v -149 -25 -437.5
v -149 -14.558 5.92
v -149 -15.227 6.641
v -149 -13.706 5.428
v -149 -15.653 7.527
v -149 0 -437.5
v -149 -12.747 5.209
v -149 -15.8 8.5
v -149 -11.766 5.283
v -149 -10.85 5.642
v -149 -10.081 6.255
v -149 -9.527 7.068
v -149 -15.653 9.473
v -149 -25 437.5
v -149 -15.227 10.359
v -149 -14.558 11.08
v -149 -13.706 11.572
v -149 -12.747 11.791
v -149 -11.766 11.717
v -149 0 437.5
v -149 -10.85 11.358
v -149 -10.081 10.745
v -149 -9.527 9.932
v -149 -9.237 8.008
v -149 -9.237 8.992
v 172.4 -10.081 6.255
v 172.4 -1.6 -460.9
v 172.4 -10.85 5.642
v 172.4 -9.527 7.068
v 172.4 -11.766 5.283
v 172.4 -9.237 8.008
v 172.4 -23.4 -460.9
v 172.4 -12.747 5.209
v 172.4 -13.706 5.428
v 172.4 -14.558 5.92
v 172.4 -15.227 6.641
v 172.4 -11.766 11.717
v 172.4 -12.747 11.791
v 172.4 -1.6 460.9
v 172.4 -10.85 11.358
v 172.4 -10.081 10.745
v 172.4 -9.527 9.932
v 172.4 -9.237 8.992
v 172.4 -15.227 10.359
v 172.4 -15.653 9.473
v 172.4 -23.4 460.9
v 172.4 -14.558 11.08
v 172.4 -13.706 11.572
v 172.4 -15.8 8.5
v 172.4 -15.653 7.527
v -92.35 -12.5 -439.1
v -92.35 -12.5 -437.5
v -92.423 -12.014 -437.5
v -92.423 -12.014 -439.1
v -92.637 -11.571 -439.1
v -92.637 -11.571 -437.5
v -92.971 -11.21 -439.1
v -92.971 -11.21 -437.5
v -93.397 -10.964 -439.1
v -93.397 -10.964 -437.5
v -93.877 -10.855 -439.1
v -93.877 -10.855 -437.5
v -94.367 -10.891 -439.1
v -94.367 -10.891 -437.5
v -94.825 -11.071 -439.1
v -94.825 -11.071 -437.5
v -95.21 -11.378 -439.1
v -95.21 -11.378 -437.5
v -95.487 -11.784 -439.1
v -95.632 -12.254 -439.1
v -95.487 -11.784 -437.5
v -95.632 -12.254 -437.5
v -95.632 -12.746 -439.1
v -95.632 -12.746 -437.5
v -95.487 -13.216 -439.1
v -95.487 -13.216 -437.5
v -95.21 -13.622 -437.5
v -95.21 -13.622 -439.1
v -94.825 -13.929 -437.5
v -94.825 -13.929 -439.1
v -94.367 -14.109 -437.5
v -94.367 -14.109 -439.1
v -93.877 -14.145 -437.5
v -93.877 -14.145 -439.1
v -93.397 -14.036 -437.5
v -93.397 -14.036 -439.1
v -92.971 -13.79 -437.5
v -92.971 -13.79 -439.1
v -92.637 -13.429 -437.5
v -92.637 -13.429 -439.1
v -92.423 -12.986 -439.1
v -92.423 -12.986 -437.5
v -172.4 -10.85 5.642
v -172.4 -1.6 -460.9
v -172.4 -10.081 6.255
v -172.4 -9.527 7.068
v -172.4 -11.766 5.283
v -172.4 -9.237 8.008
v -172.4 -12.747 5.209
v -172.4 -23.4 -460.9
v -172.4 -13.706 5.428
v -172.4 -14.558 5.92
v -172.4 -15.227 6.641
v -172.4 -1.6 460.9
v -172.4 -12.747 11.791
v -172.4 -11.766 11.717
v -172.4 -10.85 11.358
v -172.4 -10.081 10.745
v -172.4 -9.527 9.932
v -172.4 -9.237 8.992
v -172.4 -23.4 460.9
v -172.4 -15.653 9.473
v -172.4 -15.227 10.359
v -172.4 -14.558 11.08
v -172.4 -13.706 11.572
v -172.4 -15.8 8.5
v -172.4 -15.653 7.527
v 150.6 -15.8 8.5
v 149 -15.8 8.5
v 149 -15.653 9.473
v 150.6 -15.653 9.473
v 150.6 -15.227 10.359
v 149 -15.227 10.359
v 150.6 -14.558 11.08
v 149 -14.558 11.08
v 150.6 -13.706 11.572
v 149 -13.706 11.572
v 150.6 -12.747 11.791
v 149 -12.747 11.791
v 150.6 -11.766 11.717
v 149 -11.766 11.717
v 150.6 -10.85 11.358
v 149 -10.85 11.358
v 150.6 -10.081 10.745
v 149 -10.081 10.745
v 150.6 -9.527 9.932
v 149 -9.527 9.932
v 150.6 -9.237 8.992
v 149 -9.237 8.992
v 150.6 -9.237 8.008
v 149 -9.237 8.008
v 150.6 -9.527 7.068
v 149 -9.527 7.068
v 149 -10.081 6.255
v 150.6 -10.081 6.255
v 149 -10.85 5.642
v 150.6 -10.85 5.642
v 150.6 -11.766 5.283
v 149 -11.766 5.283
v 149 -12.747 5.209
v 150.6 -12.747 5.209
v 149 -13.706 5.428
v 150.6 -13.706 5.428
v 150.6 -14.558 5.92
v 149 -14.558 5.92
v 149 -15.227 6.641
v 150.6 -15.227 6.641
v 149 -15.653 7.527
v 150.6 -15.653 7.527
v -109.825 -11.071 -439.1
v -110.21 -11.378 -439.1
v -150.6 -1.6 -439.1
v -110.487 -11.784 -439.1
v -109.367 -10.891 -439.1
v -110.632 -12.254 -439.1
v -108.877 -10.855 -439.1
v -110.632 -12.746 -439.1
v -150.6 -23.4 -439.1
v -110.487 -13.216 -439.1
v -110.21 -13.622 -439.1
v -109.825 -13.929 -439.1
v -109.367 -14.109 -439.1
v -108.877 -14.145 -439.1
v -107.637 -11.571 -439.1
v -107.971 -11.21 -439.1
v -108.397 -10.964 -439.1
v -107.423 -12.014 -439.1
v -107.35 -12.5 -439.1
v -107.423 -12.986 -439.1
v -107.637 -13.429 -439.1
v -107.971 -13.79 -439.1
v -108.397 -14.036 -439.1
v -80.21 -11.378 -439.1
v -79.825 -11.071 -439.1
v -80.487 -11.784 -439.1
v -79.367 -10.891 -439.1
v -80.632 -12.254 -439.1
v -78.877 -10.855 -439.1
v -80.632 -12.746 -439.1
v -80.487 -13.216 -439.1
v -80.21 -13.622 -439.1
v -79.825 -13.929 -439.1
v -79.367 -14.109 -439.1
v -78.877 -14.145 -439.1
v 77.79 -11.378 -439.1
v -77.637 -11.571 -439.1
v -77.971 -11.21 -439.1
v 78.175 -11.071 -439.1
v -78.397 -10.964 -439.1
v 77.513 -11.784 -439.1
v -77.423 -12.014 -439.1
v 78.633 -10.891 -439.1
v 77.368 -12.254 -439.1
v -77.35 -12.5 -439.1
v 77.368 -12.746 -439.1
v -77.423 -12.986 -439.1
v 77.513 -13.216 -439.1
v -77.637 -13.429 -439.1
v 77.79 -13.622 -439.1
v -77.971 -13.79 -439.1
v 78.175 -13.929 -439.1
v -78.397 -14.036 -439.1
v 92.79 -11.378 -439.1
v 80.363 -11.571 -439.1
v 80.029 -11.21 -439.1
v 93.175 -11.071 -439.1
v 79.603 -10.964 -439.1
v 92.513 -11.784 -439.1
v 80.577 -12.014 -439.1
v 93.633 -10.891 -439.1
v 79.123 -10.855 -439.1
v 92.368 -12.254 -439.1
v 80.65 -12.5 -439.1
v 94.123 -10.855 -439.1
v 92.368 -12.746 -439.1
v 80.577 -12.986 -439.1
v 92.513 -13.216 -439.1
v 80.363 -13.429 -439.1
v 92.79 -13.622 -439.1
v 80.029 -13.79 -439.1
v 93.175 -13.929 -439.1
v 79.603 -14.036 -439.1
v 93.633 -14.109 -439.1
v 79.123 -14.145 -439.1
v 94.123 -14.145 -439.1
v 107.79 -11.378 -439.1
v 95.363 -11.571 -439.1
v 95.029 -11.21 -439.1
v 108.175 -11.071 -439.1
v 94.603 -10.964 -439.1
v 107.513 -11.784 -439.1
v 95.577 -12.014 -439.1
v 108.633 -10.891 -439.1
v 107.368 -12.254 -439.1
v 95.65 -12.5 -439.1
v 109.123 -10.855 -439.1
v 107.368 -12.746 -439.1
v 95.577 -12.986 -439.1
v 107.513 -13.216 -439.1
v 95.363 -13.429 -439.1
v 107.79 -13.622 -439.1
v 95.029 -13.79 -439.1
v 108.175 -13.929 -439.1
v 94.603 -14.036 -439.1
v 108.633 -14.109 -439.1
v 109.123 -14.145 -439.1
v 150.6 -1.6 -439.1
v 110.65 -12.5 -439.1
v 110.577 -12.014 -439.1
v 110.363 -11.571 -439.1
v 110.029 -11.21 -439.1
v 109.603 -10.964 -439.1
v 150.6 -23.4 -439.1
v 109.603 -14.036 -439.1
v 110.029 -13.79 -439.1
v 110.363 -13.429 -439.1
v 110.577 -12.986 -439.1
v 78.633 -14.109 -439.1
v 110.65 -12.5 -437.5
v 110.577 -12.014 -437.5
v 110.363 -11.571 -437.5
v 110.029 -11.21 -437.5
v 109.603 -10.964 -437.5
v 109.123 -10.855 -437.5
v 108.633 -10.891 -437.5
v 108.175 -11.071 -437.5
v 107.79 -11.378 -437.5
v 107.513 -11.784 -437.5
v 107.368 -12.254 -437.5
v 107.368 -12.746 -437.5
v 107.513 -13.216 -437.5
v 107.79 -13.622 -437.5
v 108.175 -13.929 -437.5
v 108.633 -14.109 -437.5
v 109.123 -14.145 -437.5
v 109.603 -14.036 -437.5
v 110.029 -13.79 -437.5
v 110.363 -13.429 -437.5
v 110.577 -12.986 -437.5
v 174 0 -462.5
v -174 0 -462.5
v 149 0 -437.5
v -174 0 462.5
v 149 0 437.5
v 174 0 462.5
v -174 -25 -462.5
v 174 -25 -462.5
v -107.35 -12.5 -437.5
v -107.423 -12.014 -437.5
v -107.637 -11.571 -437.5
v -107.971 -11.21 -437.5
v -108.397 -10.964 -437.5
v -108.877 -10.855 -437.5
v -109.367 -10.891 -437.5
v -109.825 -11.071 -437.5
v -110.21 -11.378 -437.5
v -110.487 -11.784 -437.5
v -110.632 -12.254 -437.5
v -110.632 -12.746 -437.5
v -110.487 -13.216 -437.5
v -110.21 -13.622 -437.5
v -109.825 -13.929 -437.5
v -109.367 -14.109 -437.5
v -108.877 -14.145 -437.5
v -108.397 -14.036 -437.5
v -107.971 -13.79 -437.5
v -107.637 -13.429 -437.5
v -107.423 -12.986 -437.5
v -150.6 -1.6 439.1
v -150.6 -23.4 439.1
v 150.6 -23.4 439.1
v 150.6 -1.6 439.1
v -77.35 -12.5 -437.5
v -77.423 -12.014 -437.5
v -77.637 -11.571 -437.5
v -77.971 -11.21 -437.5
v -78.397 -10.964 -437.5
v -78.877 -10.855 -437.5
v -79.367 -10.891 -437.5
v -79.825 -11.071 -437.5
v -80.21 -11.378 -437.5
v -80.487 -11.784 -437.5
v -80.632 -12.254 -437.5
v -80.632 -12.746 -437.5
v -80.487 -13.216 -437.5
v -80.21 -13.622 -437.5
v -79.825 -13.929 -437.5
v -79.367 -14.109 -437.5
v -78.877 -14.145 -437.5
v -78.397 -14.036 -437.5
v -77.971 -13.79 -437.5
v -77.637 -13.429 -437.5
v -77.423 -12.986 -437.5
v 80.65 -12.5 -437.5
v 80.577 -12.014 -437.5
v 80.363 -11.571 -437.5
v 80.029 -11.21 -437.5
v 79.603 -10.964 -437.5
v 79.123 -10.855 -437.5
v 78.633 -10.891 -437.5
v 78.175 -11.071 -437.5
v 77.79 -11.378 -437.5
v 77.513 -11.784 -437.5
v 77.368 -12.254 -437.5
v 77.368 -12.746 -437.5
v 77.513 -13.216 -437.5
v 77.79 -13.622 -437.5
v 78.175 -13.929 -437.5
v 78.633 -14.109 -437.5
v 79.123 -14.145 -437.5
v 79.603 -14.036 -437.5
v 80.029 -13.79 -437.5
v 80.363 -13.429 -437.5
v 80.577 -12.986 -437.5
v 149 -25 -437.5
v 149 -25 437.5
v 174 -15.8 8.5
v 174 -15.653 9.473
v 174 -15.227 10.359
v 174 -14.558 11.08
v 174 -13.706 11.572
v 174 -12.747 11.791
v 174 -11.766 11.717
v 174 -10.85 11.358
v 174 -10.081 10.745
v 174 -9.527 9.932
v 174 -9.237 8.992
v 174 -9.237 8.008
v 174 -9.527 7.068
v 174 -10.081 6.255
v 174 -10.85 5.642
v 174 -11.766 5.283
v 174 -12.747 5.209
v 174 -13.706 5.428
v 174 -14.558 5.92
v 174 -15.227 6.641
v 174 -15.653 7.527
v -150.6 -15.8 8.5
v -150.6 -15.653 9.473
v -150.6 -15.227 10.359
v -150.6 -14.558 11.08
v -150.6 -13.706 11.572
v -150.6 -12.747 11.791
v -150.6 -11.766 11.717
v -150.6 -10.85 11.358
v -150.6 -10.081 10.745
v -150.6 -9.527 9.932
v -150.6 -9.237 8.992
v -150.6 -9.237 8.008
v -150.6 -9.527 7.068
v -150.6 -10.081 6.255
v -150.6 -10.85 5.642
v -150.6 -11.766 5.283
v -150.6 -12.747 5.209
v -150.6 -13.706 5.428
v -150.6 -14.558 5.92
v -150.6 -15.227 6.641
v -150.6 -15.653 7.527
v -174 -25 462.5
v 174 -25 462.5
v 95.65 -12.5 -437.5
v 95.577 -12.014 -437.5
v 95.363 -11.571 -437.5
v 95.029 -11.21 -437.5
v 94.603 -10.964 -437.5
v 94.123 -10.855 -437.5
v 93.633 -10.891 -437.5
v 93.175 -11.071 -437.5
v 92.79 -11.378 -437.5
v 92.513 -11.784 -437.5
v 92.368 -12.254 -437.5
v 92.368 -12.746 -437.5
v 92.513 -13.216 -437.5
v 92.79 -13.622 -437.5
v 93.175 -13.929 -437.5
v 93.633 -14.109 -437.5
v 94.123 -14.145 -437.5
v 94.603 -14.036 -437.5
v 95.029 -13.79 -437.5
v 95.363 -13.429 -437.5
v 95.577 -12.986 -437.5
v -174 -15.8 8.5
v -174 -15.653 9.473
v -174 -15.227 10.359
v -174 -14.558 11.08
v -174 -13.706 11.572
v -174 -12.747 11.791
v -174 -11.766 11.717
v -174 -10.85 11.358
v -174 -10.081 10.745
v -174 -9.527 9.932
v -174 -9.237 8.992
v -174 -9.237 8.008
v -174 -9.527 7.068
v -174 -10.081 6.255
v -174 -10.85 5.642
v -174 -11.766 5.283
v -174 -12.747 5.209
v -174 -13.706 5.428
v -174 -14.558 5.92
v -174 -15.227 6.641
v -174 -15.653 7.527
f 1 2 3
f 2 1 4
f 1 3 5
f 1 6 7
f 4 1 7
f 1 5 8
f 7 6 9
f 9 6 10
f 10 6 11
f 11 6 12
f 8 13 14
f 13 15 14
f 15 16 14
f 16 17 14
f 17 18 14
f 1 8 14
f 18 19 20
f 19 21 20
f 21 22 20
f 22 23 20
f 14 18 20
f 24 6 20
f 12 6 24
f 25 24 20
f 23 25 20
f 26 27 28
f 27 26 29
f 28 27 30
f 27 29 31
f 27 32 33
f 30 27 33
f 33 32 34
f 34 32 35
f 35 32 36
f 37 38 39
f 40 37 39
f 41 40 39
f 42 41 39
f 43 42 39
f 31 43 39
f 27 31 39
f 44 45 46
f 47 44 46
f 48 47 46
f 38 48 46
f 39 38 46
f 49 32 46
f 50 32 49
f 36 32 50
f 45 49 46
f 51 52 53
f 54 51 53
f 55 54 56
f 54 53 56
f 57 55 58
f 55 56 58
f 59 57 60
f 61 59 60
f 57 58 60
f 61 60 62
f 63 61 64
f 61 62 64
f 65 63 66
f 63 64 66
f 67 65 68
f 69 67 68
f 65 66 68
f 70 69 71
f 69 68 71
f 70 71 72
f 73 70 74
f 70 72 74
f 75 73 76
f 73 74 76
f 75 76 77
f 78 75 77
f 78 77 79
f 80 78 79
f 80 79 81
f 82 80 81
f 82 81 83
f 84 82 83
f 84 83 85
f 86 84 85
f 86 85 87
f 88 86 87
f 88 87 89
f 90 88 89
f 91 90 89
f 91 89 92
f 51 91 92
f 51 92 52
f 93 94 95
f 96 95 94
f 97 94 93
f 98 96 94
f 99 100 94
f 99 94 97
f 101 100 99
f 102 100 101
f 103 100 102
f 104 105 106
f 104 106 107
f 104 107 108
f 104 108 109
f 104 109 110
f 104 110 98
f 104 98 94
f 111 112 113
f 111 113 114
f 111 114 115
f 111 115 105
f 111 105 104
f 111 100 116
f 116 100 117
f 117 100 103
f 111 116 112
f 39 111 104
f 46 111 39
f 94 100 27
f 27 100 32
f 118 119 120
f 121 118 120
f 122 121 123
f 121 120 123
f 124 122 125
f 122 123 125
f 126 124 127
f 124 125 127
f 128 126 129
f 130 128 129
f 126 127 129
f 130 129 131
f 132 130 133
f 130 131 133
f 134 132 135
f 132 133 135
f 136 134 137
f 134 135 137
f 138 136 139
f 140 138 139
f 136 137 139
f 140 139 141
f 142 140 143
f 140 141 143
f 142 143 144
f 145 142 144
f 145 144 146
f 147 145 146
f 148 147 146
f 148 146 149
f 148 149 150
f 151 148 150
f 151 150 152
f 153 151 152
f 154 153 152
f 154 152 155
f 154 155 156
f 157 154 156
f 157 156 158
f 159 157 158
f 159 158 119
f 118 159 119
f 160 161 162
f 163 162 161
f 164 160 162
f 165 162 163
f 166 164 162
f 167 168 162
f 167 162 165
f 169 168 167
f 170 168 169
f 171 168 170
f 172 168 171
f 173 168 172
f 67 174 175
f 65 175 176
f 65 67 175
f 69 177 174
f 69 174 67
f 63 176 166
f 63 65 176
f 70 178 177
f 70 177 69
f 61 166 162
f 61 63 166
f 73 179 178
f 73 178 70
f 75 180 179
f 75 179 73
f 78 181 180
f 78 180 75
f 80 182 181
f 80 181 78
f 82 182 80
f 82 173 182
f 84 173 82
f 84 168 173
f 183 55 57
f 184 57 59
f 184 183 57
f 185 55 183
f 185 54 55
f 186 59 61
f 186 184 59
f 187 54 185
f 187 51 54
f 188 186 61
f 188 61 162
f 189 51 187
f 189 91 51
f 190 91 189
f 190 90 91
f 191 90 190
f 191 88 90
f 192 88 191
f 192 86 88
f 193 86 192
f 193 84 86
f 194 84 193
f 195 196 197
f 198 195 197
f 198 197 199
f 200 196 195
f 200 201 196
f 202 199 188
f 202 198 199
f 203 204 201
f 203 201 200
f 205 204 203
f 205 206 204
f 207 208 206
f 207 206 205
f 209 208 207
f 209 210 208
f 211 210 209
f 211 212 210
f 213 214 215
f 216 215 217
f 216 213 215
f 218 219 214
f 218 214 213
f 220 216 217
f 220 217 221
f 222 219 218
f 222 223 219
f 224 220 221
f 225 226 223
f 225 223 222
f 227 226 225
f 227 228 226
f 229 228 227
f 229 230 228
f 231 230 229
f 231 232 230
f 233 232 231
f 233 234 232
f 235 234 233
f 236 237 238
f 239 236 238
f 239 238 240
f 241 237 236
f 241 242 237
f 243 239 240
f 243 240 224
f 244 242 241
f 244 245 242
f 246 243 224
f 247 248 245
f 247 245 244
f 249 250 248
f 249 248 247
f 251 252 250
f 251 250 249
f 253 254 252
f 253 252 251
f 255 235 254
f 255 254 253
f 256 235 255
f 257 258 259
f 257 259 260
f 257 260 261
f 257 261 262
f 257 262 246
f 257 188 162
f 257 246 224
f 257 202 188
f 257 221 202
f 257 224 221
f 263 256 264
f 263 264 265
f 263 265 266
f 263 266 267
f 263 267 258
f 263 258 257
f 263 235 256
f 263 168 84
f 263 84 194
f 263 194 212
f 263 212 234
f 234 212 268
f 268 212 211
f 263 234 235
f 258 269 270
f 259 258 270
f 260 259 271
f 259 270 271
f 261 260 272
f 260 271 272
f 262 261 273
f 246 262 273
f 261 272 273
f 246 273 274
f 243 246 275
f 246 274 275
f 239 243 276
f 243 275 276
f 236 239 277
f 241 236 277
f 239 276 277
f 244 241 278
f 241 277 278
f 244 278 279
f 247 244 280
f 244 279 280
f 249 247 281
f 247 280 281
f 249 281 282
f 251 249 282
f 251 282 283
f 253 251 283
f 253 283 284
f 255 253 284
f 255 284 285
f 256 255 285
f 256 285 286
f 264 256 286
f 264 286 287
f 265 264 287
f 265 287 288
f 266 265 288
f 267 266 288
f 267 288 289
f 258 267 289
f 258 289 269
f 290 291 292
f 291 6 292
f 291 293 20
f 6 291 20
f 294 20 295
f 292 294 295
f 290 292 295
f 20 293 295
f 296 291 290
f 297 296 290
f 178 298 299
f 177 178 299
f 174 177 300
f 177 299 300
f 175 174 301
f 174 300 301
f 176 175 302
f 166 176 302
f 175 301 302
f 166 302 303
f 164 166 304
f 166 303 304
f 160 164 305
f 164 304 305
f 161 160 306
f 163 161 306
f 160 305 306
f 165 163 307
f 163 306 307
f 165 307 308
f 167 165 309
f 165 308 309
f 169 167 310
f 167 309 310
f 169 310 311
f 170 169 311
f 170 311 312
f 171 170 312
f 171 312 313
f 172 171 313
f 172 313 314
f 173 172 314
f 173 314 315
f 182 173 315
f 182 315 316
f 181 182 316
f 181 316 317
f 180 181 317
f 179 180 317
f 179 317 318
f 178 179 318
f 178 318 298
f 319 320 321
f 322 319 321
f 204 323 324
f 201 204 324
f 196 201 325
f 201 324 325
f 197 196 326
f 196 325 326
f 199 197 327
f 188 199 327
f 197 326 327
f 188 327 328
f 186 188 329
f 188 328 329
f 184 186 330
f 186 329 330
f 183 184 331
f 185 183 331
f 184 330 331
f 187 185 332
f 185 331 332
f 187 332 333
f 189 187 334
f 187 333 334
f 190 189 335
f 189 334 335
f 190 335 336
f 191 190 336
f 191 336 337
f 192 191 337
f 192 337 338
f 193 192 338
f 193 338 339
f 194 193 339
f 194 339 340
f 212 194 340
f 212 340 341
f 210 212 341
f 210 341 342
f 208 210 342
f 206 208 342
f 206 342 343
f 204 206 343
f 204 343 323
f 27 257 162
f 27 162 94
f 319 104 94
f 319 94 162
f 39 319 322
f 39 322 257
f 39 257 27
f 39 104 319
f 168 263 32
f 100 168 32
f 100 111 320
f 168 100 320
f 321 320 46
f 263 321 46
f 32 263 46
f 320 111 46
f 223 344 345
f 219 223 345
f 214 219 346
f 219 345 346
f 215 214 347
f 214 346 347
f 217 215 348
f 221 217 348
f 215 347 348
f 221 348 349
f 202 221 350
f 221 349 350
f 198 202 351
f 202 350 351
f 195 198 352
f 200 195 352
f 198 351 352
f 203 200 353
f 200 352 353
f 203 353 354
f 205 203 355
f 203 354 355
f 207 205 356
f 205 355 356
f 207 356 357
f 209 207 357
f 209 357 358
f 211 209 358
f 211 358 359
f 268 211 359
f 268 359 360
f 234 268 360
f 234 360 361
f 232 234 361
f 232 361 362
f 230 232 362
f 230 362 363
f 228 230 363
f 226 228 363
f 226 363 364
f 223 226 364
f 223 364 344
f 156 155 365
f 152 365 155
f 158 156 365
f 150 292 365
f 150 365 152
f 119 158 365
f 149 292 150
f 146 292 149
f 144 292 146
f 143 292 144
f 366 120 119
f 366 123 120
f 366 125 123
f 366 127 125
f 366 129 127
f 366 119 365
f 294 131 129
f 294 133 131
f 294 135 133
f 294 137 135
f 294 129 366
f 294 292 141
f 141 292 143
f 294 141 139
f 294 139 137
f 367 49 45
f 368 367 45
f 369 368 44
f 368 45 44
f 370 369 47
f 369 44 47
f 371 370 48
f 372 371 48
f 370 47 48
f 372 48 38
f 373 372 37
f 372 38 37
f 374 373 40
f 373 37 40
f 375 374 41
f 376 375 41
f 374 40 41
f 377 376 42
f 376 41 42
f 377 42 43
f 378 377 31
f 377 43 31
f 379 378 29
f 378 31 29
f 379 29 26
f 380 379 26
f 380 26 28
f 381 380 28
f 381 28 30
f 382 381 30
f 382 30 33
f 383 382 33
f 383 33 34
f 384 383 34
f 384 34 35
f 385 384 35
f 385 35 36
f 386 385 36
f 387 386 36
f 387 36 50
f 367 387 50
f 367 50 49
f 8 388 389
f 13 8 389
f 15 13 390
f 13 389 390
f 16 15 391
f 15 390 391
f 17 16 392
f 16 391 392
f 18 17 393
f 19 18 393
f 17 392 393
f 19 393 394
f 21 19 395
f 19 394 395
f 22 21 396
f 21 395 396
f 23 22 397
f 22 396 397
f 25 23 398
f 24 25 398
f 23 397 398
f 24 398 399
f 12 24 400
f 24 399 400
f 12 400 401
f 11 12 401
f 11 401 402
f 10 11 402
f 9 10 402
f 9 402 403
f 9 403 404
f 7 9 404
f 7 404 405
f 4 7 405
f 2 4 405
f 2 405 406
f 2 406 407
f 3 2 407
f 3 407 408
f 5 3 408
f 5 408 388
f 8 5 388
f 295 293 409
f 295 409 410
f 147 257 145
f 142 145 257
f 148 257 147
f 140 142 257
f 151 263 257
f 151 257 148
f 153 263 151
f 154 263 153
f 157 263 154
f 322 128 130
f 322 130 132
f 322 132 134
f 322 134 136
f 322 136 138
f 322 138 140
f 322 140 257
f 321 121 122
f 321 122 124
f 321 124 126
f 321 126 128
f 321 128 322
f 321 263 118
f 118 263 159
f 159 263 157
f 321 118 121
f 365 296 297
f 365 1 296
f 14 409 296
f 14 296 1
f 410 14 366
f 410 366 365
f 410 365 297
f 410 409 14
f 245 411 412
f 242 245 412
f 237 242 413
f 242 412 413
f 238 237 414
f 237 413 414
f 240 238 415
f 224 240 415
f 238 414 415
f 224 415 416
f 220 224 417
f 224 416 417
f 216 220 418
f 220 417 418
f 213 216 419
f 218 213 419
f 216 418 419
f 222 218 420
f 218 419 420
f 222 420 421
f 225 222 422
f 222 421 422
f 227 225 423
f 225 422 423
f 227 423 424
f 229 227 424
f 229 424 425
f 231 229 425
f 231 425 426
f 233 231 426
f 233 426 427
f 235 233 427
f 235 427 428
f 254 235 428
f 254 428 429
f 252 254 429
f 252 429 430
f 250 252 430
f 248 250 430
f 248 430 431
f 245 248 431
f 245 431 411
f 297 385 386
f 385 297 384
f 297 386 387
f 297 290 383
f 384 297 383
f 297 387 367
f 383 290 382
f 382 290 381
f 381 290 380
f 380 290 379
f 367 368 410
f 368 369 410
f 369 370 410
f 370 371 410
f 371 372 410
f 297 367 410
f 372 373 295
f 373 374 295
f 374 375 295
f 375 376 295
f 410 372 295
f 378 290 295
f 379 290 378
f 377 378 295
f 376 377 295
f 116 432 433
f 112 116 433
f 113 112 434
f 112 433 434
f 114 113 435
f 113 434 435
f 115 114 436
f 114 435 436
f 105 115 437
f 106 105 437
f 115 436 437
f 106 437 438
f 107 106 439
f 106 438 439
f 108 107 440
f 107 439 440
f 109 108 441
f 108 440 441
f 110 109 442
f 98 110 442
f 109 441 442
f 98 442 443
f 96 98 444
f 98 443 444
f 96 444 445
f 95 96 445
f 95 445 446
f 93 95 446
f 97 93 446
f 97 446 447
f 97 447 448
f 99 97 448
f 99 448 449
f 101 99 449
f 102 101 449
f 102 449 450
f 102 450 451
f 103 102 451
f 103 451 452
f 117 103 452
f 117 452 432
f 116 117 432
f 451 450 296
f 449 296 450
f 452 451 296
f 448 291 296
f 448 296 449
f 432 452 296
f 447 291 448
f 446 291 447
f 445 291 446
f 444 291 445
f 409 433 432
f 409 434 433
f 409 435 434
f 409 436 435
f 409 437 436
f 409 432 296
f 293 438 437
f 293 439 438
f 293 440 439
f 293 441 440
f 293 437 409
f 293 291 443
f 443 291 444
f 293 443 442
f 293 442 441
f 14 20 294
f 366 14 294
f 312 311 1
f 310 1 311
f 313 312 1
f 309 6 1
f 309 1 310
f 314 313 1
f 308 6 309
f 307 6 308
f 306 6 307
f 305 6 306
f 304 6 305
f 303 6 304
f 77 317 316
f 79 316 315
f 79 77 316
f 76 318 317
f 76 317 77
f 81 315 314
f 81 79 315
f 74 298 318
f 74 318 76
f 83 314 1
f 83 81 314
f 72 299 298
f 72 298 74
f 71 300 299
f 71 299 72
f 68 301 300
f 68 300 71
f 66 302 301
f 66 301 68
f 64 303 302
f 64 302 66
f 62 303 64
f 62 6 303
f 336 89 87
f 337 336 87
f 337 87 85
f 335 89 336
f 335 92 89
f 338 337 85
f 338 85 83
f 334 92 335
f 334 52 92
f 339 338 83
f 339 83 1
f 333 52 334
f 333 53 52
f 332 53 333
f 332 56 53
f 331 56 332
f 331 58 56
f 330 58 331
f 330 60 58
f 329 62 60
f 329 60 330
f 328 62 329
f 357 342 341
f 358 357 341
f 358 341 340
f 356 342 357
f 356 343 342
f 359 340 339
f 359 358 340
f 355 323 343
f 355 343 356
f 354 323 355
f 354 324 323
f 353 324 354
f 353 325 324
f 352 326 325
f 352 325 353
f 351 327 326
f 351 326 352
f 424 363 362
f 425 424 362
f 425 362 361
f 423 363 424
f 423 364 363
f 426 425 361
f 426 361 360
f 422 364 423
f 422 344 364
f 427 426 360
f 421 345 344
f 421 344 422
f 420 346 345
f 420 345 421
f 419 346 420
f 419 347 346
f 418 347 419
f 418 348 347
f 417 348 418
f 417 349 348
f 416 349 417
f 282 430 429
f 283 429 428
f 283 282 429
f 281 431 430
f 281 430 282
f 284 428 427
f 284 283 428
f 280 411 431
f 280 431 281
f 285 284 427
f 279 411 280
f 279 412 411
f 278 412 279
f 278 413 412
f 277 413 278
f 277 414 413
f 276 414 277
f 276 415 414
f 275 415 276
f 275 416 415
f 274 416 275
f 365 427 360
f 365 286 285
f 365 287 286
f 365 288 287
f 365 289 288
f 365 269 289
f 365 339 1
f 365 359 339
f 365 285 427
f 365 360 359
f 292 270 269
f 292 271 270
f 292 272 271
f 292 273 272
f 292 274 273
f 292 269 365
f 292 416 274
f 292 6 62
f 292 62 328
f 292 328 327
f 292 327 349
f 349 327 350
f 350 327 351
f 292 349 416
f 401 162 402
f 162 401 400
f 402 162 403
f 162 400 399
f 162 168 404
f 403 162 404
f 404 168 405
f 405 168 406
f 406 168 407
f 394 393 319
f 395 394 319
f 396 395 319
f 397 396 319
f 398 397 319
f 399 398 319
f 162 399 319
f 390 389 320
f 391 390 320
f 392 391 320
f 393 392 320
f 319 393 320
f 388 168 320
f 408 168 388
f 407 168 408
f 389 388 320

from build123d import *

# Parameters (mm, degrees)
F0_W     = 348
F0_H     = 925
F0_W_2   = 298
F0_H_2   = 875
F1_DEPTH = 25
F3_D     = 6.6
F3_DEPTH = 500
F3_TIP   = 1.9828400428
F4_R     = 1.65
F5_DEPTH = 4
F7_W     = 344.8
F7_H     = 921.8
F7_W_2   = 301.2
F7_H_2   = 878.2
F8_DEPTH = 21.8


with BuildPart() as f1:
    # F0 (on Front) → F1 (new body)
    with BuildSketch(Plane.XZ):
        Rectangle(F0_W, F0_H)
        Rectangle(F0_W_2, F0_H_2, mode=Mode.SUBTRACT)
    extrude(amount=F1_DEPTH)

    # F3
    with Locations(Plane.YZ.offset(174)):
        with Locations((-12.5, 8.5)):
            Hole(F3_D / 2, depth=F3_DEPTH)
            with Locations((0, 0, -(F3_DEPTH + F3_TIP / 2))):  # 118° drill point
                Cone(0, F3_D / 2, F3_TIP, mode=Mode.SUBTRACT)

    # F4 (on face) → F5 (cut)
    with BuildSketch(Plane.XY.offset(-437.5)):
        with Locations((109, -12.5)):
            Circle(F4_R)
        with Locations((94, -12.5)):
            Circle(F4_R)
        with Locations((79, -12.5)):
            Circle(F4_R)
        with Locations((-79, -12.5)):
            Circle(F4_R)
        with Locations((-94, -12.5)):
            Circle(F4_R)
        with Locations((-109, -12.5)):
            Circle(F4_R)
    extrude(amount=-F5_DEPTH, mode=Mode.SUBTRACT)

    # F7 (on offset) → F8 (cut)
    with BuildSketch(Plane.XZ.offset(23.4)):
        Rectangle(F7_W, F7_H)
        Rectangle(F7_W_2, F7_H_2, mode=Mode.SUBTRACT)
    extrude(amount=-F8_DEPTH, mode=Mode.SUBTRACT)


solid = f1.part
